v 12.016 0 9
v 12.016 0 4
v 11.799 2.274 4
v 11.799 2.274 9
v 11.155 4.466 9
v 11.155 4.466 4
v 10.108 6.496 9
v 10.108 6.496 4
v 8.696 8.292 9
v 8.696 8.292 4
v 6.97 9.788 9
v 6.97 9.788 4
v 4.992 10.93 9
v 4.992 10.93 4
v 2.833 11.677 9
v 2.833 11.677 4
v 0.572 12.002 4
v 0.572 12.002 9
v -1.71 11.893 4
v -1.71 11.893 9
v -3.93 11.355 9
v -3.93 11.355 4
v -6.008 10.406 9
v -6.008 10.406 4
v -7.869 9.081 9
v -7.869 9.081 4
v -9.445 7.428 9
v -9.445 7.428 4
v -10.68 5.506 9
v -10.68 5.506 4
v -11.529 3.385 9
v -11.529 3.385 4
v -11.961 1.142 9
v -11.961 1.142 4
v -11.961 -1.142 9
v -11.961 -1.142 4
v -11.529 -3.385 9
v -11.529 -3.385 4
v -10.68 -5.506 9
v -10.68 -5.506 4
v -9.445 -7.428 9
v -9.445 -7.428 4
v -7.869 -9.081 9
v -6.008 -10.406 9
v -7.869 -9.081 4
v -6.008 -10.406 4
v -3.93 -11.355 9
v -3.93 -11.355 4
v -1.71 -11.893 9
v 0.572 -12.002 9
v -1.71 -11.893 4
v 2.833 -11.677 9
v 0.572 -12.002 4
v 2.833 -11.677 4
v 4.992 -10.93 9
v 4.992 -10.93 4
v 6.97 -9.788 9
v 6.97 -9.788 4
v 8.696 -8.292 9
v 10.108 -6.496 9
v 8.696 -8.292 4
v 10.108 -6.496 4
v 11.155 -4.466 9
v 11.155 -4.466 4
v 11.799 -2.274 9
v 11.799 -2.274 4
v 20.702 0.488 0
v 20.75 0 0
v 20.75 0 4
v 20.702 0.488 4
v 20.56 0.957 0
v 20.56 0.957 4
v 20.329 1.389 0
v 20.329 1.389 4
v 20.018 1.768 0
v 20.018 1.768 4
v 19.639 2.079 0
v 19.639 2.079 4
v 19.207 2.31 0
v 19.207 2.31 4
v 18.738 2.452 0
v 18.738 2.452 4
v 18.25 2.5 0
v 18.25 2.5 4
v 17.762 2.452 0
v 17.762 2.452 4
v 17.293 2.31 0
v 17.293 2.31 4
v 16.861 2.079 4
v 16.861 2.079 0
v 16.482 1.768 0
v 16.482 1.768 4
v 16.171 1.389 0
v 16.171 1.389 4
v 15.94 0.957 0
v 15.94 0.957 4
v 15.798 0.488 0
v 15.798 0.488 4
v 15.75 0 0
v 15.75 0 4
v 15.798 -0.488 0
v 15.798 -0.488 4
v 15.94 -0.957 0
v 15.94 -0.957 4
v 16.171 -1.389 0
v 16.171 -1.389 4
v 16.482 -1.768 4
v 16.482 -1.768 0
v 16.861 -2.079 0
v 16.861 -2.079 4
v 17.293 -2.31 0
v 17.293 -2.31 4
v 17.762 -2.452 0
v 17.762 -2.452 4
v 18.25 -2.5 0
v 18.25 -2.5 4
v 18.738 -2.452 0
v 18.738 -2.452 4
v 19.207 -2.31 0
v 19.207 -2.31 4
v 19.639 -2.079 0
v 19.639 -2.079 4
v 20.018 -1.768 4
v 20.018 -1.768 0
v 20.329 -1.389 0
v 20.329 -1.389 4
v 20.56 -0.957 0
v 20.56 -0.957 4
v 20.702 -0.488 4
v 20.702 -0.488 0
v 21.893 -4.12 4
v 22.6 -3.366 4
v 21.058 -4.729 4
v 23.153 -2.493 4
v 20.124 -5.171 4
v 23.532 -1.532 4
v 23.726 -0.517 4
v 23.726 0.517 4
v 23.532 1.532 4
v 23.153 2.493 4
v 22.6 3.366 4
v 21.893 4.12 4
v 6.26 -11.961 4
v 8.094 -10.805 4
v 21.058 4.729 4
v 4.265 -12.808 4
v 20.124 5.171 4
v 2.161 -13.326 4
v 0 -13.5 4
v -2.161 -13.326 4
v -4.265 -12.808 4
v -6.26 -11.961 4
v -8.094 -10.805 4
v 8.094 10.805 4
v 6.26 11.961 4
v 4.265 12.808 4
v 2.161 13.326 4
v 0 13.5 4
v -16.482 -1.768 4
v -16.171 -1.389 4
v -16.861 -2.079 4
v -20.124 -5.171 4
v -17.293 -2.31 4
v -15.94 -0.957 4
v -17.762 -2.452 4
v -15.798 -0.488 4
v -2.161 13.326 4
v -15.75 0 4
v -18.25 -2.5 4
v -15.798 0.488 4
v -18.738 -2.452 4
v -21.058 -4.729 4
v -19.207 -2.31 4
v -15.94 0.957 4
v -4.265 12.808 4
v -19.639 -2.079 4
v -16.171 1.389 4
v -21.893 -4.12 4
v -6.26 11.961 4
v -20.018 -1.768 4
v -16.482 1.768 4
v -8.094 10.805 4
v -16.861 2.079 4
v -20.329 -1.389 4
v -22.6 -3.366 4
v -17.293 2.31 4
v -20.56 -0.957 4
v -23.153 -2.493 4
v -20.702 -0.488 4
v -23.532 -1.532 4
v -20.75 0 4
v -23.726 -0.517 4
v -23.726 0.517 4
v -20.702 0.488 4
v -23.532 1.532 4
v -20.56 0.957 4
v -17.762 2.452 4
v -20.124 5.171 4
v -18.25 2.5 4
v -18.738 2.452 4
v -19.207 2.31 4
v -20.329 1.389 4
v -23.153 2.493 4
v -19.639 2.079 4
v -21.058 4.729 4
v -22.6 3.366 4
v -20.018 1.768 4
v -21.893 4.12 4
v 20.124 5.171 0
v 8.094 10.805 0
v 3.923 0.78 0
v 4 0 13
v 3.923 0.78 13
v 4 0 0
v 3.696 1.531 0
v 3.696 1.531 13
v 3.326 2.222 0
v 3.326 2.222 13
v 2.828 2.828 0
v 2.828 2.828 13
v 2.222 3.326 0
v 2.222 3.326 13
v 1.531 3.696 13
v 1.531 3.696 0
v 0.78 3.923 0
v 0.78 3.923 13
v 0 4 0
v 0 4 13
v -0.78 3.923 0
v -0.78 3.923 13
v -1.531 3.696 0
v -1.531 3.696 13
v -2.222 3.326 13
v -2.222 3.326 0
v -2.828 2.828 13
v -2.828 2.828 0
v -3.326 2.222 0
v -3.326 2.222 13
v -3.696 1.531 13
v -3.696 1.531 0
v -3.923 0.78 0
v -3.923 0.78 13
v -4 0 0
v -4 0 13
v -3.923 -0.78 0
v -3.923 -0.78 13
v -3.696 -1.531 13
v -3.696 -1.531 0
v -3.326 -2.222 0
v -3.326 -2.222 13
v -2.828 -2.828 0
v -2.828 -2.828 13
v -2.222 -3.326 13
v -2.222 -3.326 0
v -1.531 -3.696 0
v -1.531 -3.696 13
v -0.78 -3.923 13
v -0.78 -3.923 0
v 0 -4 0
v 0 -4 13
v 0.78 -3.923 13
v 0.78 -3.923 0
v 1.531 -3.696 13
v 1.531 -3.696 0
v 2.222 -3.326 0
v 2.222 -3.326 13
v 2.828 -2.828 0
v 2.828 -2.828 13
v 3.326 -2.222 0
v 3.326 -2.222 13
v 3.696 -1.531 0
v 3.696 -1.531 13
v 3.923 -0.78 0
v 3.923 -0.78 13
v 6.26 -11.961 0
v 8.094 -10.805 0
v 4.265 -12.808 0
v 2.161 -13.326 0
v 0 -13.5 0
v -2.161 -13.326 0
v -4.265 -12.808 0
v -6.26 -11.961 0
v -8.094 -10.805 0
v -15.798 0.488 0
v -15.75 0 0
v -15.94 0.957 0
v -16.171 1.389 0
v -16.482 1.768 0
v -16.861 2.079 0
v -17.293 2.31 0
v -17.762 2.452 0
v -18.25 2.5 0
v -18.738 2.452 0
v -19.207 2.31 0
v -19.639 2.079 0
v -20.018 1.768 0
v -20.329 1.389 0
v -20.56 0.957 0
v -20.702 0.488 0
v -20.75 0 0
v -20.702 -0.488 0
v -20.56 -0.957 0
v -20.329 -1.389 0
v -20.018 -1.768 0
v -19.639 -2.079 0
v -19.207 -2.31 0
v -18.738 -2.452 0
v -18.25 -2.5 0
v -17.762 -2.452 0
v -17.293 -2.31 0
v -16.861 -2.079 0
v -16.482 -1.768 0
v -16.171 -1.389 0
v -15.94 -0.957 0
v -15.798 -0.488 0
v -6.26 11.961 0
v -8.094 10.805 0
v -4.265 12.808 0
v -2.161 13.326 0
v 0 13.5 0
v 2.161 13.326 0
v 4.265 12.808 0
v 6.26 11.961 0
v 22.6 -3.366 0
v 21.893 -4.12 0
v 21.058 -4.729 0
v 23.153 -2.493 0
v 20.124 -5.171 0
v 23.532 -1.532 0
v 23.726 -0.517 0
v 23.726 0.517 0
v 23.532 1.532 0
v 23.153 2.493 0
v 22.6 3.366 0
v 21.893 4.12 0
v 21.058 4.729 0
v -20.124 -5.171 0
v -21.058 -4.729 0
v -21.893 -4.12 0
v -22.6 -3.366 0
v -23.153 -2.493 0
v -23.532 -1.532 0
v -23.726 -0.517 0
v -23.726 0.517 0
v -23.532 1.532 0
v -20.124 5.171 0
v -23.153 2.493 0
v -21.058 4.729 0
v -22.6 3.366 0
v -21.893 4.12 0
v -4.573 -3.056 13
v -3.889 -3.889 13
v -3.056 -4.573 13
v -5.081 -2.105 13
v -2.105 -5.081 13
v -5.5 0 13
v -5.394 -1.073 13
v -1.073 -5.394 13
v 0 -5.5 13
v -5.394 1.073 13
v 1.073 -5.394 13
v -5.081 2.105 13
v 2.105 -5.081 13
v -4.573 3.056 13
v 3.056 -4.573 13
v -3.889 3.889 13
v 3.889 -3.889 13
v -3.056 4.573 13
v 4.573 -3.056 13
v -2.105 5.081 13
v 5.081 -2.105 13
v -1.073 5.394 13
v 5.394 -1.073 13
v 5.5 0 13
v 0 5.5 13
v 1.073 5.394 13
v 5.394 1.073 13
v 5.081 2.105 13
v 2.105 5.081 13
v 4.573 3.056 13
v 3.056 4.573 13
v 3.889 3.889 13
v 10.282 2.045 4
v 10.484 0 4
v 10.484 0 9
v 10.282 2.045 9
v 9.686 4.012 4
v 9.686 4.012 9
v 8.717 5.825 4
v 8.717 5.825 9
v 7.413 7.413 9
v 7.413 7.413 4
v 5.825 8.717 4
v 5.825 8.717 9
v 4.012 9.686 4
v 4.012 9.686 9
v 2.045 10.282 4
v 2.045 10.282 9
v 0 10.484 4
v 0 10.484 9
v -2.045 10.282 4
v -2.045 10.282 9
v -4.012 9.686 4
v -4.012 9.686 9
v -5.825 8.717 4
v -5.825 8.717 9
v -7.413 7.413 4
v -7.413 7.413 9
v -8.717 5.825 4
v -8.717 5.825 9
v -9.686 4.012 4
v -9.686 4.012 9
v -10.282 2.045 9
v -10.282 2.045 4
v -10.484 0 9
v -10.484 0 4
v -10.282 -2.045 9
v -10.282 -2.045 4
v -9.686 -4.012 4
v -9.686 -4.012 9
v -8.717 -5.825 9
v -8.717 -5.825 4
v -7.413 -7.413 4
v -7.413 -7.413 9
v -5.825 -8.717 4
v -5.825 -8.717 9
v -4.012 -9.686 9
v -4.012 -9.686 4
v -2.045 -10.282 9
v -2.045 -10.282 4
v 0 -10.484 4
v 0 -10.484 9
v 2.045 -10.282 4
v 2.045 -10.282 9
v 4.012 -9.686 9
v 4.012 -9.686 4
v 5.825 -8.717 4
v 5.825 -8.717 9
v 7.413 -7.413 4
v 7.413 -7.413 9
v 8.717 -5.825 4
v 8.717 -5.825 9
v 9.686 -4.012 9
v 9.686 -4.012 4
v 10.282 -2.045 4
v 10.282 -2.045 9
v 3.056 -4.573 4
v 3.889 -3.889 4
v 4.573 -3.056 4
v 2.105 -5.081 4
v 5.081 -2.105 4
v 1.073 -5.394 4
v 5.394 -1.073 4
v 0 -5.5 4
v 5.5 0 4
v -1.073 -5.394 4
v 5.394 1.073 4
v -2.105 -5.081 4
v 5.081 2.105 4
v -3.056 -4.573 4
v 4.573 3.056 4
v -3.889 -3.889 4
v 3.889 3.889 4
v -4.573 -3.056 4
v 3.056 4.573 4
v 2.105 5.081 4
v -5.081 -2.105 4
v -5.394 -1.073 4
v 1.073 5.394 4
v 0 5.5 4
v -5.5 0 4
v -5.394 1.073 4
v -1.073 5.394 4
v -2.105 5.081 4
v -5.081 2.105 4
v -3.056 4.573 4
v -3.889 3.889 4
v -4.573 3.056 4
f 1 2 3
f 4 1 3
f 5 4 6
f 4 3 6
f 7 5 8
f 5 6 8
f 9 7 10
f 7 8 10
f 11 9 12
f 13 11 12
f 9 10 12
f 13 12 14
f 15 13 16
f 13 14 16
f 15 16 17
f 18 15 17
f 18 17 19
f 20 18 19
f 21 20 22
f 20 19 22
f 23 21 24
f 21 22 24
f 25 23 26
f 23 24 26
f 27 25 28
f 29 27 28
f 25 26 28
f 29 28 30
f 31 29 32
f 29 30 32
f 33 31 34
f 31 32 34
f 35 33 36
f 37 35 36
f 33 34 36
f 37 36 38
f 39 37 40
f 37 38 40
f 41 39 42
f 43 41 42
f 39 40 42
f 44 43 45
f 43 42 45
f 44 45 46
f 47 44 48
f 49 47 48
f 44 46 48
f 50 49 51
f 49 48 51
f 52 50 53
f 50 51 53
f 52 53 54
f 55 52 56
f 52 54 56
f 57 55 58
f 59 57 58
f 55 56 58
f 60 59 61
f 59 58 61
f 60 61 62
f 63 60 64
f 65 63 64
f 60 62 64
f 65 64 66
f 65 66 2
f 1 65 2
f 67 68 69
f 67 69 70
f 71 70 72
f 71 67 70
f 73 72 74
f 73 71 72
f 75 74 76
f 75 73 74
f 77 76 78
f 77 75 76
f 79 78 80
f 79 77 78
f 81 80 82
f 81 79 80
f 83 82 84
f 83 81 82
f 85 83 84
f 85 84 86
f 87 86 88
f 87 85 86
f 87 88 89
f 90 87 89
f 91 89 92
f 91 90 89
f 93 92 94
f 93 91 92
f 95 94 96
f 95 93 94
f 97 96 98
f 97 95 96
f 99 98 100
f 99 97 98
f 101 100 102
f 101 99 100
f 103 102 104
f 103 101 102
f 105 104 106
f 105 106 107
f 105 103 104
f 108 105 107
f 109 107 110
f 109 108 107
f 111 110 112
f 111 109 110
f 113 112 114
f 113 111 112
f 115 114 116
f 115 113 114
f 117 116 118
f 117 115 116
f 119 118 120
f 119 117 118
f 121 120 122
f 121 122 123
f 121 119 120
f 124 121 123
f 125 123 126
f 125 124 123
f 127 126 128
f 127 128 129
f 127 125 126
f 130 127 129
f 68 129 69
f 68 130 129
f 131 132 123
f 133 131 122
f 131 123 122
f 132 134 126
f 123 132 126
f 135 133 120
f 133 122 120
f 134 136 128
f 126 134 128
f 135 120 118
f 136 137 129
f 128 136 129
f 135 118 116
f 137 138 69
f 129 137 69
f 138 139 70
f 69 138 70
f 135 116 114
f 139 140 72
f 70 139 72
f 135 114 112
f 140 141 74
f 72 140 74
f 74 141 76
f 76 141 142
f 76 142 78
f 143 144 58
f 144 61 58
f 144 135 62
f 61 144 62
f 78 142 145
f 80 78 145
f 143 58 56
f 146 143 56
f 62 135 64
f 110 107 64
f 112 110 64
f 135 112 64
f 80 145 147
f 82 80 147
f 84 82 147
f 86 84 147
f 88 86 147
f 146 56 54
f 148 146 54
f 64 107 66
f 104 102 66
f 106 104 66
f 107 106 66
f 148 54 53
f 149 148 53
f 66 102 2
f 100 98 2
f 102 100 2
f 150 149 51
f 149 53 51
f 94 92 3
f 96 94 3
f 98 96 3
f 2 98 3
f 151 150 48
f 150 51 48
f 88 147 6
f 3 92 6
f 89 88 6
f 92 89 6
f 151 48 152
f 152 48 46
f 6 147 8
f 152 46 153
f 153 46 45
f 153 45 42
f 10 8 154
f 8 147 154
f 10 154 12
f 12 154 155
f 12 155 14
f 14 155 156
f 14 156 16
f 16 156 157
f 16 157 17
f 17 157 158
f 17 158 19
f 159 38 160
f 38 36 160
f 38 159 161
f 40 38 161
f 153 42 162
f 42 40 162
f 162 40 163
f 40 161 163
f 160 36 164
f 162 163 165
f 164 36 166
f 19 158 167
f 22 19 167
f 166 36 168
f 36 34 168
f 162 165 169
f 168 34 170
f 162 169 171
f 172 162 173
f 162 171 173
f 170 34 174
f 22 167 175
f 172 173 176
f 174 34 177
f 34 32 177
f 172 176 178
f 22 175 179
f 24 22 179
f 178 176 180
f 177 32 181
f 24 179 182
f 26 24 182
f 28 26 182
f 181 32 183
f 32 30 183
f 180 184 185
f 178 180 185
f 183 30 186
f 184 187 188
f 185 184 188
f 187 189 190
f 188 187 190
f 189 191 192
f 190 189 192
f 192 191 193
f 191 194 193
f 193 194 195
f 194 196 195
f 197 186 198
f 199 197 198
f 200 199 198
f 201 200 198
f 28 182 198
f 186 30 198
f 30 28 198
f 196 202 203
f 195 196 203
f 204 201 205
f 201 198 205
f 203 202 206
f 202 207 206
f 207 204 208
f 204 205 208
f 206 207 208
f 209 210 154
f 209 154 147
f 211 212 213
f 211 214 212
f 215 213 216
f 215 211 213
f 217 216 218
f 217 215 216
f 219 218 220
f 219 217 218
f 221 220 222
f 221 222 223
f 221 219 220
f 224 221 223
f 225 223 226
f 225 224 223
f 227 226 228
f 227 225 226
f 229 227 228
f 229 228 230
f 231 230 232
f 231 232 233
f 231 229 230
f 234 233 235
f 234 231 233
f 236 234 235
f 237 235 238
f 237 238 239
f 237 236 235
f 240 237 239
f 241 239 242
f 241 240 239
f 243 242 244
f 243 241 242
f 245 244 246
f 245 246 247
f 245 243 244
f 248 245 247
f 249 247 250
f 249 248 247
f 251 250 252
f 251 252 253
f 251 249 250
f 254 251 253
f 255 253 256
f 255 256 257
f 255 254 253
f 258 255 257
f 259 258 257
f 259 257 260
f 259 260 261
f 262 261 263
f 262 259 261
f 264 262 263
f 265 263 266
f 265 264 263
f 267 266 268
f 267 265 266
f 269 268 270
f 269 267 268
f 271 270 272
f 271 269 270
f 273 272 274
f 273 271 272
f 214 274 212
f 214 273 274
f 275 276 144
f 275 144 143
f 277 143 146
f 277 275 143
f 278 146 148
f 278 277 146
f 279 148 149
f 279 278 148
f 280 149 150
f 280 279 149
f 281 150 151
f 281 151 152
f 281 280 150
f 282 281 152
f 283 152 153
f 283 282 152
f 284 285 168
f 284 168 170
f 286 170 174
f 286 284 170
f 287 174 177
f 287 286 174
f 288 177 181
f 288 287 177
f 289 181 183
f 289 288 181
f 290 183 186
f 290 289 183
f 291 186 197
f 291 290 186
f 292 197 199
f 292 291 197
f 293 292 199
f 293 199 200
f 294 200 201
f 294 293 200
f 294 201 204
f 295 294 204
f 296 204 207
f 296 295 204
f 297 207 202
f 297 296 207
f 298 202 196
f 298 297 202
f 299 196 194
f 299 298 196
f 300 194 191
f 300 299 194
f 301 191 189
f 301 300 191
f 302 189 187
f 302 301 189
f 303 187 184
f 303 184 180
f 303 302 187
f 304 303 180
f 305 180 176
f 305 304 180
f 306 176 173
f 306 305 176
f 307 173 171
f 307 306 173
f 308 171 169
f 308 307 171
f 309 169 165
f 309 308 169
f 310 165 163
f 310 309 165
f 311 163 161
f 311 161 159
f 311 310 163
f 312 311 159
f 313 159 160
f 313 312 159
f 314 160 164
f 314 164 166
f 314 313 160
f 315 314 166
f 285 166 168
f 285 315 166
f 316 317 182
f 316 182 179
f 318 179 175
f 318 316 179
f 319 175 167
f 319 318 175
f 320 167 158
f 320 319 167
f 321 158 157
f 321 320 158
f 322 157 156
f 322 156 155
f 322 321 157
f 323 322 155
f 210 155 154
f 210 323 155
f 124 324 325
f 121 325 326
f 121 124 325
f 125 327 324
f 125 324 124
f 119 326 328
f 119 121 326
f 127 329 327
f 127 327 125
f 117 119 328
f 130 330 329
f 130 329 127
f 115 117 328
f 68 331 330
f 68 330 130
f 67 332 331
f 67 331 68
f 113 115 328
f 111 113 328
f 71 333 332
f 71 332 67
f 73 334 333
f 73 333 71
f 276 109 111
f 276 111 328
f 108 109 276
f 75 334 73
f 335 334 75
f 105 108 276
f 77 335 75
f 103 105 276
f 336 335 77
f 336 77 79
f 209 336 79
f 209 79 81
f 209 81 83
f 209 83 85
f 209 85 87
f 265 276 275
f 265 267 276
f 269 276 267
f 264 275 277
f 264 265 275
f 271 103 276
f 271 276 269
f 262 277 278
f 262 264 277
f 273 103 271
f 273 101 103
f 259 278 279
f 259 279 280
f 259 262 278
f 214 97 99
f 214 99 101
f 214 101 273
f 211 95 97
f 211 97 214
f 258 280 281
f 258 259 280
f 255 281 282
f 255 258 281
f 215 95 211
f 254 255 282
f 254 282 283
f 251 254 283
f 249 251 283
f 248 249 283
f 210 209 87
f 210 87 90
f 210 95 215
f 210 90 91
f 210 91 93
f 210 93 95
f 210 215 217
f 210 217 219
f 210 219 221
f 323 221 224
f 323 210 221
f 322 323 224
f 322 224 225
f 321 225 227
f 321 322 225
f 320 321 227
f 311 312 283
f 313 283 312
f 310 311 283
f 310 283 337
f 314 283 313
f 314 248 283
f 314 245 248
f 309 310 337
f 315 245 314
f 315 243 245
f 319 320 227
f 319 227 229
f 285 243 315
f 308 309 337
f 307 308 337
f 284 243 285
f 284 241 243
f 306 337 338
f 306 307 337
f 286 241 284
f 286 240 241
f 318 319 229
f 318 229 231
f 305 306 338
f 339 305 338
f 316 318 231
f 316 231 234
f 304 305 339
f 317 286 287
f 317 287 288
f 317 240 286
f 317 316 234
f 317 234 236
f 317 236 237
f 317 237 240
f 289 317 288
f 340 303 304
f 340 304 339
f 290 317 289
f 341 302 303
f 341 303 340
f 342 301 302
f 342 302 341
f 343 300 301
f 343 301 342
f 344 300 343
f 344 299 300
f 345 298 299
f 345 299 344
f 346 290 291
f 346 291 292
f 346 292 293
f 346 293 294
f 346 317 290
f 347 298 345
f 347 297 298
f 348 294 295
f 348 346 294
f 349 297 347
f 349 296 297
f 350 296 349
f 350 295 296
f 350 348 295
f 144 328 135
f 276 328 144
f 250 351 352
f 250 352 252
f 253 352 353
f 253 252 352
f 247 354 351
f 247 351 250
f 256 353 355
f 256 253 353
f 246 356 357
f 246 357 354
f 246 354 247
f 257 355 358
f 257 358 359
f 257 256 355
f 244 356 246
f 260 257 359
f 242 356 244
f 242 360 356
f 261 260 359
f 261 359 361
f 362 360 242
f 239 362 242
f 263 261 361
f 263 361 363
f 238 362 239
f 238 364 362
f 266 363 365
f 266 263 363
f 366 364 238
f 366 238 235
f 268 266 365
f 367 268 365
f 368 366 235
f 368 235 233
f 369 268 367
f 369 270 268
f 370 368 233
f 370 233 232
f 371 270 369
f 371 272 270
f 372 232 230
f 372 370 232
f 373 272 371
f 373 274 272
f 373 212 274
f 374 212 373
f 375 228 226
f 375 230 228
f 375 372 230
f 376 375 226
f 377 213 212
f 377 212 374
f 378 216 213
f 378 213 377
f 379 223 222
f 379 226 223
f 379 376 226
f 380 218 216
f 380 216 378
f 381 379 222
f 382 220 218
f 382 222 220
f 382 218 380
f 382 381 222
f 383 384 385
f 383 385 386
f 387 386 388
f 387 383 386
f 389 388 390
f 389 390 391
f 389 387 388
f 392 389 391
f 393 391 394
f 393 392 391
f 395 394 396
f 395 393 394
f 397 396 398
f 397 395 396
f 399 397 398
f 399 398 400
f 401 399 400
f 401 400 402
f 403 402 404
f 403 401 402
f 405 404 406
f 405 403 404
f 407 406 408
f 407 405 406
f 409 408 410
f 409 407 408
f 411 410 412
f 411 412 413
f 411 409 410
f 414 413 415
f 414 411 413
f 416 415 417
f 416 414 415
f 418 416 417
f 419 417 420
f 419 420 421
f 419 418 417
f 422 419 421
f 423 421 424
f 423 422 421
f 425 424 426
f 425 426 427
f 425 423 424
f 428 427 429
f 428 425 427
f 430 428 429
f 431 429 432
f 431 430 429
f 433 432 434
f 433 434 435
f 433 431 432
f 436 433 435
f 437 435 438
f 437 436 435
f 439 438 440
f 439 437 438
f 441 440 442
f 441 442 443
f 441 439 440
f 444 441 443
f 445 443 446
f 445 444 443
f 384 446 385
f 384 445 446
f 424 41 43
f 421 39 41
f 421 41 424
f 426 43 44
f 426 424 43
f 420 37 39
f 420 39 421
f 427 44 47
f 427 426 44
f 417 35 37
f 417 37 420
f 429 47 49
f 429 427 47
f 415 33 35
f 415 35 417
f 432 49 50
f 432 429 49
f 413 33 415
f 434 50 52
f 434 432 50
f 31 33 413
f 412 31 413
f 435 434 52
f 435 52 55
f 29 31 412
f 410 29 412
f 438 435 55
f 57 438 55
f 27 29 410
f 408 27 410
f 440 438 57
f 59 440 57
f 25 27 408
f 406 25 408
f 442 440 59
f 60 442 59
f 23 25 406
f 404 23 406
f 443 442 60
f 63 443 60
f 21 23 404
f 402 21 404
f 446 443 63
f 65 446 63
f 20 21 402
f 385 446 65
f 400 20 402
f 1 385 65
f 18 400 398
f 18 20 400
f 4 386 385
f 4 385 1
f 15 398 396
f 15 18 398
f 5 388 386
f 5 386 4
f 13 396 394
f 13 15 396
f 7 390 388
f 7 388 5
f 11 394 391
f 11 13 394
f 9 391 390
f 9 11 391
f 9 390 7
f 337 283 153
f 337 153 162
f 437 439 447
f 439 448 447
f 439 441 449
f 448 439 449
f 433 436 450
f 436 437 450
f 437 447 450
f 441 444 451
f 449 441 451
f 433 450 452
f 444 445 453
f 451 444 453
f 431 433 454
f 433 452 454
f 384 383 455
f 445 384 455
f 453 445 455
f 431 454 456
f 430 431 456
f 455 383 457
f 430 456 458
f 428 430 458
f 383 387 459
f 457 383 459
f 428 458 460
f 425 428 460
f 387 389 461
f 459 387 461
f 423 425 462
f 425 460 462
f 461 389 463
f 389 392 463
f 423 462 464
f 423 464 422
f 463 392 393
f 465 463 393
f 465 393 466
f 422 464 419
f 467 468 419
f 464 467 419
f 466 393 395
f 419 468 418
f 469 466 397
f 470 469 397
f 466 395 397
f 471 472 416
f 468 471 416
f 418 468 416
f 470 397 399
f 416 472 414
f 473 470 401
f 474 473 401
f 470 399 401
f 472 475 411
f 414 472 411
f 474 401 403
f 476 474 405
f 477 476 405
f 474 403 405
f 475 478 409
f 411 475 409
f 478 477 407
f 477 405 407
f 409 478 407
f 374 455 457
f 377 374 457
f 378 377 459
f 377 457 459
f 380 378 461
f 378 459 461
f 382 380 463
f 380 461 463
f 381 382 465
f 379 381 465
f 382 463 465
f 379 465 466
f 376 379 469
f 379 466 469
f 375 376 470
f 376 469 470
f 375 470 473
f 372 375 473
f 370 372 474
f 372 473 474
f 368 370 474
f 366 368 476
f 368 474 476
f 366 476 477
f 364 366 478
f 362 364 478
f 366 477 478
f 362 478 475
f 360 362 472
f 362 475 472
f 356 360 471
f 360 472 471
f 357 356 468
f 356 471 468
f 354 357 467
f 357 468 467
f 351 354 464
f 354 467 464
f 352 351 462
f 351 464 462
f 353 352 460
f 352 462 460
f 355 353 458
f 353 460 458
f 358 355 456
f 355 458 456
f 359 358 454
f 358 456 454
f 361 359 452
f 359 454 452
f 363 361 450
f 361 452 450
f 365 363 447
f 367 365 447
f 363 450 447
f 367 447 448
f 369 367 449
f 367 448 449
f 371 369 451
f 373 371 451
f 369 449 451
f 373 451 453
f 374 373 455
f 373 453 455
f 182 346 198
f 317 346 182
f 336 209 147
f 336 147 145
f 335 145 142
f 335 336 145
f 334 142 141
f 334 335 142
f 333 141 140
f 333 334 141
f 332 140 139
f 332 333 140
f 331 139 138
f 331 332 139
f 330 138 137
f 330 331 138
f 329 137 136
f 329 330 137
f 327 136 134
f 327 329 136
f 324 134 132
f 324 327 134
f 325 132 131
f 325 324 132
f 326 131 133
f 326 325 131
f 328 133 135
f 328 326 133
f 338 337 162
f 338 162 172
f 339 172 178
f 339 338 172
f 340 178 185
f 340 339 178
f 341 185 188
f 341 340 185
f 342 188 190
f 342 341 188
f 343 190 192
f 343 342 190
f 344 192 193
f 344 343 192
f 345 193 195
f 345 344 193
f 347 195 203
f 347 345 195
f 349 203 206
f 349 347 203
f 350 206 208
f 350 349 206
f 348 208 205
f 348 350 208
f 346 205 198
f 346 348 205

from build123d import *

# Parameters (mm, degrees)
ESBO_O1_R                = 4
ESBO_O1_R_2              = 2.5
RESSALTO_EXTRUS_O1_DEPTH = 4
ESBO_O2_R                = 12.015701032
ESBO_O2_R_2              = 10.48384183
RESSALTO_EXTRUS_O2_DEPTH = 5
ESBO_O3_R                = 5.5
ESBO_O3_R_2              = 4
RESSALTO_EXTRUS_O3_DEPTH = 9


with BuildPart() as part:
    # Esboço1 → Ressalto-extrusão1 (new body)
    with BuildSketch(Plane.XY):
        with BuildLine():
            Line((-20.12399727, 5.170892982), (-8.093718556, 10.80470823))
            ThreePointArc((-8.093718556, 10.80470823), (0, 13.5), (8.093718556, 10.80470823))
            Line((8.093718556, 10.80470823), (20.12399727, 5.170892982))
            ThreePointArc((20.12399727, 5.170892982), (23.75, 0), (20.12399727, -5.170892982))
            Line((20.12399727, -5.170892982), (8.093718556, -10.80470823))
            ThreePointArc((8.093718556, -10.80470823), (0, -13.5), (-8.093718556, -10.80470823))
            Line((-8.093718556, -10.80470823), (-20.12399727, -5.170892982))
            ThreePointArc((-20.12399727, -5.170892982), (-23.75, 0), (-20.12399727, 5.170892982))
        make_face()
        Circle(ESBO_O1_R, mode=Mode.SUBTRACT)
        with Locations((-18.25, 0)):
            Circle(ESBO_O1_R_2, mode=Mode.SUBTRACT)
        with Locations((18.25, 0)):
            Circle(ESBO_O1_R_2, mode=Mode.SUBTRACT)
    extrude(amount=RESSALTO_EXTRUS_O1_DEPTH)

    # Esboço2 → Ressalto-extrusão2 (add)
    with BuildSketch(Plane.XY.offset(4)):
        Circle(ESBO_O2_R)
        Circle(ESBO_O2_R_2, mode=Mode.SUBTRACT)
    extrude(amount=RESSALTO_EXTRUS_O2_DEPTH)

    # Esboço3 → Ressalto-extrusão3 (add)
    with BuildSketch(Plane.XY.offset(4)):
        Circle(ESBO_O3_R)
        Circle(ESBO_O3_R_2, mode=Mode.SUBTRACT)
    extrude(amount=RESSALTO_EXTRUS_O3_DEPTH)


solid = part.part
